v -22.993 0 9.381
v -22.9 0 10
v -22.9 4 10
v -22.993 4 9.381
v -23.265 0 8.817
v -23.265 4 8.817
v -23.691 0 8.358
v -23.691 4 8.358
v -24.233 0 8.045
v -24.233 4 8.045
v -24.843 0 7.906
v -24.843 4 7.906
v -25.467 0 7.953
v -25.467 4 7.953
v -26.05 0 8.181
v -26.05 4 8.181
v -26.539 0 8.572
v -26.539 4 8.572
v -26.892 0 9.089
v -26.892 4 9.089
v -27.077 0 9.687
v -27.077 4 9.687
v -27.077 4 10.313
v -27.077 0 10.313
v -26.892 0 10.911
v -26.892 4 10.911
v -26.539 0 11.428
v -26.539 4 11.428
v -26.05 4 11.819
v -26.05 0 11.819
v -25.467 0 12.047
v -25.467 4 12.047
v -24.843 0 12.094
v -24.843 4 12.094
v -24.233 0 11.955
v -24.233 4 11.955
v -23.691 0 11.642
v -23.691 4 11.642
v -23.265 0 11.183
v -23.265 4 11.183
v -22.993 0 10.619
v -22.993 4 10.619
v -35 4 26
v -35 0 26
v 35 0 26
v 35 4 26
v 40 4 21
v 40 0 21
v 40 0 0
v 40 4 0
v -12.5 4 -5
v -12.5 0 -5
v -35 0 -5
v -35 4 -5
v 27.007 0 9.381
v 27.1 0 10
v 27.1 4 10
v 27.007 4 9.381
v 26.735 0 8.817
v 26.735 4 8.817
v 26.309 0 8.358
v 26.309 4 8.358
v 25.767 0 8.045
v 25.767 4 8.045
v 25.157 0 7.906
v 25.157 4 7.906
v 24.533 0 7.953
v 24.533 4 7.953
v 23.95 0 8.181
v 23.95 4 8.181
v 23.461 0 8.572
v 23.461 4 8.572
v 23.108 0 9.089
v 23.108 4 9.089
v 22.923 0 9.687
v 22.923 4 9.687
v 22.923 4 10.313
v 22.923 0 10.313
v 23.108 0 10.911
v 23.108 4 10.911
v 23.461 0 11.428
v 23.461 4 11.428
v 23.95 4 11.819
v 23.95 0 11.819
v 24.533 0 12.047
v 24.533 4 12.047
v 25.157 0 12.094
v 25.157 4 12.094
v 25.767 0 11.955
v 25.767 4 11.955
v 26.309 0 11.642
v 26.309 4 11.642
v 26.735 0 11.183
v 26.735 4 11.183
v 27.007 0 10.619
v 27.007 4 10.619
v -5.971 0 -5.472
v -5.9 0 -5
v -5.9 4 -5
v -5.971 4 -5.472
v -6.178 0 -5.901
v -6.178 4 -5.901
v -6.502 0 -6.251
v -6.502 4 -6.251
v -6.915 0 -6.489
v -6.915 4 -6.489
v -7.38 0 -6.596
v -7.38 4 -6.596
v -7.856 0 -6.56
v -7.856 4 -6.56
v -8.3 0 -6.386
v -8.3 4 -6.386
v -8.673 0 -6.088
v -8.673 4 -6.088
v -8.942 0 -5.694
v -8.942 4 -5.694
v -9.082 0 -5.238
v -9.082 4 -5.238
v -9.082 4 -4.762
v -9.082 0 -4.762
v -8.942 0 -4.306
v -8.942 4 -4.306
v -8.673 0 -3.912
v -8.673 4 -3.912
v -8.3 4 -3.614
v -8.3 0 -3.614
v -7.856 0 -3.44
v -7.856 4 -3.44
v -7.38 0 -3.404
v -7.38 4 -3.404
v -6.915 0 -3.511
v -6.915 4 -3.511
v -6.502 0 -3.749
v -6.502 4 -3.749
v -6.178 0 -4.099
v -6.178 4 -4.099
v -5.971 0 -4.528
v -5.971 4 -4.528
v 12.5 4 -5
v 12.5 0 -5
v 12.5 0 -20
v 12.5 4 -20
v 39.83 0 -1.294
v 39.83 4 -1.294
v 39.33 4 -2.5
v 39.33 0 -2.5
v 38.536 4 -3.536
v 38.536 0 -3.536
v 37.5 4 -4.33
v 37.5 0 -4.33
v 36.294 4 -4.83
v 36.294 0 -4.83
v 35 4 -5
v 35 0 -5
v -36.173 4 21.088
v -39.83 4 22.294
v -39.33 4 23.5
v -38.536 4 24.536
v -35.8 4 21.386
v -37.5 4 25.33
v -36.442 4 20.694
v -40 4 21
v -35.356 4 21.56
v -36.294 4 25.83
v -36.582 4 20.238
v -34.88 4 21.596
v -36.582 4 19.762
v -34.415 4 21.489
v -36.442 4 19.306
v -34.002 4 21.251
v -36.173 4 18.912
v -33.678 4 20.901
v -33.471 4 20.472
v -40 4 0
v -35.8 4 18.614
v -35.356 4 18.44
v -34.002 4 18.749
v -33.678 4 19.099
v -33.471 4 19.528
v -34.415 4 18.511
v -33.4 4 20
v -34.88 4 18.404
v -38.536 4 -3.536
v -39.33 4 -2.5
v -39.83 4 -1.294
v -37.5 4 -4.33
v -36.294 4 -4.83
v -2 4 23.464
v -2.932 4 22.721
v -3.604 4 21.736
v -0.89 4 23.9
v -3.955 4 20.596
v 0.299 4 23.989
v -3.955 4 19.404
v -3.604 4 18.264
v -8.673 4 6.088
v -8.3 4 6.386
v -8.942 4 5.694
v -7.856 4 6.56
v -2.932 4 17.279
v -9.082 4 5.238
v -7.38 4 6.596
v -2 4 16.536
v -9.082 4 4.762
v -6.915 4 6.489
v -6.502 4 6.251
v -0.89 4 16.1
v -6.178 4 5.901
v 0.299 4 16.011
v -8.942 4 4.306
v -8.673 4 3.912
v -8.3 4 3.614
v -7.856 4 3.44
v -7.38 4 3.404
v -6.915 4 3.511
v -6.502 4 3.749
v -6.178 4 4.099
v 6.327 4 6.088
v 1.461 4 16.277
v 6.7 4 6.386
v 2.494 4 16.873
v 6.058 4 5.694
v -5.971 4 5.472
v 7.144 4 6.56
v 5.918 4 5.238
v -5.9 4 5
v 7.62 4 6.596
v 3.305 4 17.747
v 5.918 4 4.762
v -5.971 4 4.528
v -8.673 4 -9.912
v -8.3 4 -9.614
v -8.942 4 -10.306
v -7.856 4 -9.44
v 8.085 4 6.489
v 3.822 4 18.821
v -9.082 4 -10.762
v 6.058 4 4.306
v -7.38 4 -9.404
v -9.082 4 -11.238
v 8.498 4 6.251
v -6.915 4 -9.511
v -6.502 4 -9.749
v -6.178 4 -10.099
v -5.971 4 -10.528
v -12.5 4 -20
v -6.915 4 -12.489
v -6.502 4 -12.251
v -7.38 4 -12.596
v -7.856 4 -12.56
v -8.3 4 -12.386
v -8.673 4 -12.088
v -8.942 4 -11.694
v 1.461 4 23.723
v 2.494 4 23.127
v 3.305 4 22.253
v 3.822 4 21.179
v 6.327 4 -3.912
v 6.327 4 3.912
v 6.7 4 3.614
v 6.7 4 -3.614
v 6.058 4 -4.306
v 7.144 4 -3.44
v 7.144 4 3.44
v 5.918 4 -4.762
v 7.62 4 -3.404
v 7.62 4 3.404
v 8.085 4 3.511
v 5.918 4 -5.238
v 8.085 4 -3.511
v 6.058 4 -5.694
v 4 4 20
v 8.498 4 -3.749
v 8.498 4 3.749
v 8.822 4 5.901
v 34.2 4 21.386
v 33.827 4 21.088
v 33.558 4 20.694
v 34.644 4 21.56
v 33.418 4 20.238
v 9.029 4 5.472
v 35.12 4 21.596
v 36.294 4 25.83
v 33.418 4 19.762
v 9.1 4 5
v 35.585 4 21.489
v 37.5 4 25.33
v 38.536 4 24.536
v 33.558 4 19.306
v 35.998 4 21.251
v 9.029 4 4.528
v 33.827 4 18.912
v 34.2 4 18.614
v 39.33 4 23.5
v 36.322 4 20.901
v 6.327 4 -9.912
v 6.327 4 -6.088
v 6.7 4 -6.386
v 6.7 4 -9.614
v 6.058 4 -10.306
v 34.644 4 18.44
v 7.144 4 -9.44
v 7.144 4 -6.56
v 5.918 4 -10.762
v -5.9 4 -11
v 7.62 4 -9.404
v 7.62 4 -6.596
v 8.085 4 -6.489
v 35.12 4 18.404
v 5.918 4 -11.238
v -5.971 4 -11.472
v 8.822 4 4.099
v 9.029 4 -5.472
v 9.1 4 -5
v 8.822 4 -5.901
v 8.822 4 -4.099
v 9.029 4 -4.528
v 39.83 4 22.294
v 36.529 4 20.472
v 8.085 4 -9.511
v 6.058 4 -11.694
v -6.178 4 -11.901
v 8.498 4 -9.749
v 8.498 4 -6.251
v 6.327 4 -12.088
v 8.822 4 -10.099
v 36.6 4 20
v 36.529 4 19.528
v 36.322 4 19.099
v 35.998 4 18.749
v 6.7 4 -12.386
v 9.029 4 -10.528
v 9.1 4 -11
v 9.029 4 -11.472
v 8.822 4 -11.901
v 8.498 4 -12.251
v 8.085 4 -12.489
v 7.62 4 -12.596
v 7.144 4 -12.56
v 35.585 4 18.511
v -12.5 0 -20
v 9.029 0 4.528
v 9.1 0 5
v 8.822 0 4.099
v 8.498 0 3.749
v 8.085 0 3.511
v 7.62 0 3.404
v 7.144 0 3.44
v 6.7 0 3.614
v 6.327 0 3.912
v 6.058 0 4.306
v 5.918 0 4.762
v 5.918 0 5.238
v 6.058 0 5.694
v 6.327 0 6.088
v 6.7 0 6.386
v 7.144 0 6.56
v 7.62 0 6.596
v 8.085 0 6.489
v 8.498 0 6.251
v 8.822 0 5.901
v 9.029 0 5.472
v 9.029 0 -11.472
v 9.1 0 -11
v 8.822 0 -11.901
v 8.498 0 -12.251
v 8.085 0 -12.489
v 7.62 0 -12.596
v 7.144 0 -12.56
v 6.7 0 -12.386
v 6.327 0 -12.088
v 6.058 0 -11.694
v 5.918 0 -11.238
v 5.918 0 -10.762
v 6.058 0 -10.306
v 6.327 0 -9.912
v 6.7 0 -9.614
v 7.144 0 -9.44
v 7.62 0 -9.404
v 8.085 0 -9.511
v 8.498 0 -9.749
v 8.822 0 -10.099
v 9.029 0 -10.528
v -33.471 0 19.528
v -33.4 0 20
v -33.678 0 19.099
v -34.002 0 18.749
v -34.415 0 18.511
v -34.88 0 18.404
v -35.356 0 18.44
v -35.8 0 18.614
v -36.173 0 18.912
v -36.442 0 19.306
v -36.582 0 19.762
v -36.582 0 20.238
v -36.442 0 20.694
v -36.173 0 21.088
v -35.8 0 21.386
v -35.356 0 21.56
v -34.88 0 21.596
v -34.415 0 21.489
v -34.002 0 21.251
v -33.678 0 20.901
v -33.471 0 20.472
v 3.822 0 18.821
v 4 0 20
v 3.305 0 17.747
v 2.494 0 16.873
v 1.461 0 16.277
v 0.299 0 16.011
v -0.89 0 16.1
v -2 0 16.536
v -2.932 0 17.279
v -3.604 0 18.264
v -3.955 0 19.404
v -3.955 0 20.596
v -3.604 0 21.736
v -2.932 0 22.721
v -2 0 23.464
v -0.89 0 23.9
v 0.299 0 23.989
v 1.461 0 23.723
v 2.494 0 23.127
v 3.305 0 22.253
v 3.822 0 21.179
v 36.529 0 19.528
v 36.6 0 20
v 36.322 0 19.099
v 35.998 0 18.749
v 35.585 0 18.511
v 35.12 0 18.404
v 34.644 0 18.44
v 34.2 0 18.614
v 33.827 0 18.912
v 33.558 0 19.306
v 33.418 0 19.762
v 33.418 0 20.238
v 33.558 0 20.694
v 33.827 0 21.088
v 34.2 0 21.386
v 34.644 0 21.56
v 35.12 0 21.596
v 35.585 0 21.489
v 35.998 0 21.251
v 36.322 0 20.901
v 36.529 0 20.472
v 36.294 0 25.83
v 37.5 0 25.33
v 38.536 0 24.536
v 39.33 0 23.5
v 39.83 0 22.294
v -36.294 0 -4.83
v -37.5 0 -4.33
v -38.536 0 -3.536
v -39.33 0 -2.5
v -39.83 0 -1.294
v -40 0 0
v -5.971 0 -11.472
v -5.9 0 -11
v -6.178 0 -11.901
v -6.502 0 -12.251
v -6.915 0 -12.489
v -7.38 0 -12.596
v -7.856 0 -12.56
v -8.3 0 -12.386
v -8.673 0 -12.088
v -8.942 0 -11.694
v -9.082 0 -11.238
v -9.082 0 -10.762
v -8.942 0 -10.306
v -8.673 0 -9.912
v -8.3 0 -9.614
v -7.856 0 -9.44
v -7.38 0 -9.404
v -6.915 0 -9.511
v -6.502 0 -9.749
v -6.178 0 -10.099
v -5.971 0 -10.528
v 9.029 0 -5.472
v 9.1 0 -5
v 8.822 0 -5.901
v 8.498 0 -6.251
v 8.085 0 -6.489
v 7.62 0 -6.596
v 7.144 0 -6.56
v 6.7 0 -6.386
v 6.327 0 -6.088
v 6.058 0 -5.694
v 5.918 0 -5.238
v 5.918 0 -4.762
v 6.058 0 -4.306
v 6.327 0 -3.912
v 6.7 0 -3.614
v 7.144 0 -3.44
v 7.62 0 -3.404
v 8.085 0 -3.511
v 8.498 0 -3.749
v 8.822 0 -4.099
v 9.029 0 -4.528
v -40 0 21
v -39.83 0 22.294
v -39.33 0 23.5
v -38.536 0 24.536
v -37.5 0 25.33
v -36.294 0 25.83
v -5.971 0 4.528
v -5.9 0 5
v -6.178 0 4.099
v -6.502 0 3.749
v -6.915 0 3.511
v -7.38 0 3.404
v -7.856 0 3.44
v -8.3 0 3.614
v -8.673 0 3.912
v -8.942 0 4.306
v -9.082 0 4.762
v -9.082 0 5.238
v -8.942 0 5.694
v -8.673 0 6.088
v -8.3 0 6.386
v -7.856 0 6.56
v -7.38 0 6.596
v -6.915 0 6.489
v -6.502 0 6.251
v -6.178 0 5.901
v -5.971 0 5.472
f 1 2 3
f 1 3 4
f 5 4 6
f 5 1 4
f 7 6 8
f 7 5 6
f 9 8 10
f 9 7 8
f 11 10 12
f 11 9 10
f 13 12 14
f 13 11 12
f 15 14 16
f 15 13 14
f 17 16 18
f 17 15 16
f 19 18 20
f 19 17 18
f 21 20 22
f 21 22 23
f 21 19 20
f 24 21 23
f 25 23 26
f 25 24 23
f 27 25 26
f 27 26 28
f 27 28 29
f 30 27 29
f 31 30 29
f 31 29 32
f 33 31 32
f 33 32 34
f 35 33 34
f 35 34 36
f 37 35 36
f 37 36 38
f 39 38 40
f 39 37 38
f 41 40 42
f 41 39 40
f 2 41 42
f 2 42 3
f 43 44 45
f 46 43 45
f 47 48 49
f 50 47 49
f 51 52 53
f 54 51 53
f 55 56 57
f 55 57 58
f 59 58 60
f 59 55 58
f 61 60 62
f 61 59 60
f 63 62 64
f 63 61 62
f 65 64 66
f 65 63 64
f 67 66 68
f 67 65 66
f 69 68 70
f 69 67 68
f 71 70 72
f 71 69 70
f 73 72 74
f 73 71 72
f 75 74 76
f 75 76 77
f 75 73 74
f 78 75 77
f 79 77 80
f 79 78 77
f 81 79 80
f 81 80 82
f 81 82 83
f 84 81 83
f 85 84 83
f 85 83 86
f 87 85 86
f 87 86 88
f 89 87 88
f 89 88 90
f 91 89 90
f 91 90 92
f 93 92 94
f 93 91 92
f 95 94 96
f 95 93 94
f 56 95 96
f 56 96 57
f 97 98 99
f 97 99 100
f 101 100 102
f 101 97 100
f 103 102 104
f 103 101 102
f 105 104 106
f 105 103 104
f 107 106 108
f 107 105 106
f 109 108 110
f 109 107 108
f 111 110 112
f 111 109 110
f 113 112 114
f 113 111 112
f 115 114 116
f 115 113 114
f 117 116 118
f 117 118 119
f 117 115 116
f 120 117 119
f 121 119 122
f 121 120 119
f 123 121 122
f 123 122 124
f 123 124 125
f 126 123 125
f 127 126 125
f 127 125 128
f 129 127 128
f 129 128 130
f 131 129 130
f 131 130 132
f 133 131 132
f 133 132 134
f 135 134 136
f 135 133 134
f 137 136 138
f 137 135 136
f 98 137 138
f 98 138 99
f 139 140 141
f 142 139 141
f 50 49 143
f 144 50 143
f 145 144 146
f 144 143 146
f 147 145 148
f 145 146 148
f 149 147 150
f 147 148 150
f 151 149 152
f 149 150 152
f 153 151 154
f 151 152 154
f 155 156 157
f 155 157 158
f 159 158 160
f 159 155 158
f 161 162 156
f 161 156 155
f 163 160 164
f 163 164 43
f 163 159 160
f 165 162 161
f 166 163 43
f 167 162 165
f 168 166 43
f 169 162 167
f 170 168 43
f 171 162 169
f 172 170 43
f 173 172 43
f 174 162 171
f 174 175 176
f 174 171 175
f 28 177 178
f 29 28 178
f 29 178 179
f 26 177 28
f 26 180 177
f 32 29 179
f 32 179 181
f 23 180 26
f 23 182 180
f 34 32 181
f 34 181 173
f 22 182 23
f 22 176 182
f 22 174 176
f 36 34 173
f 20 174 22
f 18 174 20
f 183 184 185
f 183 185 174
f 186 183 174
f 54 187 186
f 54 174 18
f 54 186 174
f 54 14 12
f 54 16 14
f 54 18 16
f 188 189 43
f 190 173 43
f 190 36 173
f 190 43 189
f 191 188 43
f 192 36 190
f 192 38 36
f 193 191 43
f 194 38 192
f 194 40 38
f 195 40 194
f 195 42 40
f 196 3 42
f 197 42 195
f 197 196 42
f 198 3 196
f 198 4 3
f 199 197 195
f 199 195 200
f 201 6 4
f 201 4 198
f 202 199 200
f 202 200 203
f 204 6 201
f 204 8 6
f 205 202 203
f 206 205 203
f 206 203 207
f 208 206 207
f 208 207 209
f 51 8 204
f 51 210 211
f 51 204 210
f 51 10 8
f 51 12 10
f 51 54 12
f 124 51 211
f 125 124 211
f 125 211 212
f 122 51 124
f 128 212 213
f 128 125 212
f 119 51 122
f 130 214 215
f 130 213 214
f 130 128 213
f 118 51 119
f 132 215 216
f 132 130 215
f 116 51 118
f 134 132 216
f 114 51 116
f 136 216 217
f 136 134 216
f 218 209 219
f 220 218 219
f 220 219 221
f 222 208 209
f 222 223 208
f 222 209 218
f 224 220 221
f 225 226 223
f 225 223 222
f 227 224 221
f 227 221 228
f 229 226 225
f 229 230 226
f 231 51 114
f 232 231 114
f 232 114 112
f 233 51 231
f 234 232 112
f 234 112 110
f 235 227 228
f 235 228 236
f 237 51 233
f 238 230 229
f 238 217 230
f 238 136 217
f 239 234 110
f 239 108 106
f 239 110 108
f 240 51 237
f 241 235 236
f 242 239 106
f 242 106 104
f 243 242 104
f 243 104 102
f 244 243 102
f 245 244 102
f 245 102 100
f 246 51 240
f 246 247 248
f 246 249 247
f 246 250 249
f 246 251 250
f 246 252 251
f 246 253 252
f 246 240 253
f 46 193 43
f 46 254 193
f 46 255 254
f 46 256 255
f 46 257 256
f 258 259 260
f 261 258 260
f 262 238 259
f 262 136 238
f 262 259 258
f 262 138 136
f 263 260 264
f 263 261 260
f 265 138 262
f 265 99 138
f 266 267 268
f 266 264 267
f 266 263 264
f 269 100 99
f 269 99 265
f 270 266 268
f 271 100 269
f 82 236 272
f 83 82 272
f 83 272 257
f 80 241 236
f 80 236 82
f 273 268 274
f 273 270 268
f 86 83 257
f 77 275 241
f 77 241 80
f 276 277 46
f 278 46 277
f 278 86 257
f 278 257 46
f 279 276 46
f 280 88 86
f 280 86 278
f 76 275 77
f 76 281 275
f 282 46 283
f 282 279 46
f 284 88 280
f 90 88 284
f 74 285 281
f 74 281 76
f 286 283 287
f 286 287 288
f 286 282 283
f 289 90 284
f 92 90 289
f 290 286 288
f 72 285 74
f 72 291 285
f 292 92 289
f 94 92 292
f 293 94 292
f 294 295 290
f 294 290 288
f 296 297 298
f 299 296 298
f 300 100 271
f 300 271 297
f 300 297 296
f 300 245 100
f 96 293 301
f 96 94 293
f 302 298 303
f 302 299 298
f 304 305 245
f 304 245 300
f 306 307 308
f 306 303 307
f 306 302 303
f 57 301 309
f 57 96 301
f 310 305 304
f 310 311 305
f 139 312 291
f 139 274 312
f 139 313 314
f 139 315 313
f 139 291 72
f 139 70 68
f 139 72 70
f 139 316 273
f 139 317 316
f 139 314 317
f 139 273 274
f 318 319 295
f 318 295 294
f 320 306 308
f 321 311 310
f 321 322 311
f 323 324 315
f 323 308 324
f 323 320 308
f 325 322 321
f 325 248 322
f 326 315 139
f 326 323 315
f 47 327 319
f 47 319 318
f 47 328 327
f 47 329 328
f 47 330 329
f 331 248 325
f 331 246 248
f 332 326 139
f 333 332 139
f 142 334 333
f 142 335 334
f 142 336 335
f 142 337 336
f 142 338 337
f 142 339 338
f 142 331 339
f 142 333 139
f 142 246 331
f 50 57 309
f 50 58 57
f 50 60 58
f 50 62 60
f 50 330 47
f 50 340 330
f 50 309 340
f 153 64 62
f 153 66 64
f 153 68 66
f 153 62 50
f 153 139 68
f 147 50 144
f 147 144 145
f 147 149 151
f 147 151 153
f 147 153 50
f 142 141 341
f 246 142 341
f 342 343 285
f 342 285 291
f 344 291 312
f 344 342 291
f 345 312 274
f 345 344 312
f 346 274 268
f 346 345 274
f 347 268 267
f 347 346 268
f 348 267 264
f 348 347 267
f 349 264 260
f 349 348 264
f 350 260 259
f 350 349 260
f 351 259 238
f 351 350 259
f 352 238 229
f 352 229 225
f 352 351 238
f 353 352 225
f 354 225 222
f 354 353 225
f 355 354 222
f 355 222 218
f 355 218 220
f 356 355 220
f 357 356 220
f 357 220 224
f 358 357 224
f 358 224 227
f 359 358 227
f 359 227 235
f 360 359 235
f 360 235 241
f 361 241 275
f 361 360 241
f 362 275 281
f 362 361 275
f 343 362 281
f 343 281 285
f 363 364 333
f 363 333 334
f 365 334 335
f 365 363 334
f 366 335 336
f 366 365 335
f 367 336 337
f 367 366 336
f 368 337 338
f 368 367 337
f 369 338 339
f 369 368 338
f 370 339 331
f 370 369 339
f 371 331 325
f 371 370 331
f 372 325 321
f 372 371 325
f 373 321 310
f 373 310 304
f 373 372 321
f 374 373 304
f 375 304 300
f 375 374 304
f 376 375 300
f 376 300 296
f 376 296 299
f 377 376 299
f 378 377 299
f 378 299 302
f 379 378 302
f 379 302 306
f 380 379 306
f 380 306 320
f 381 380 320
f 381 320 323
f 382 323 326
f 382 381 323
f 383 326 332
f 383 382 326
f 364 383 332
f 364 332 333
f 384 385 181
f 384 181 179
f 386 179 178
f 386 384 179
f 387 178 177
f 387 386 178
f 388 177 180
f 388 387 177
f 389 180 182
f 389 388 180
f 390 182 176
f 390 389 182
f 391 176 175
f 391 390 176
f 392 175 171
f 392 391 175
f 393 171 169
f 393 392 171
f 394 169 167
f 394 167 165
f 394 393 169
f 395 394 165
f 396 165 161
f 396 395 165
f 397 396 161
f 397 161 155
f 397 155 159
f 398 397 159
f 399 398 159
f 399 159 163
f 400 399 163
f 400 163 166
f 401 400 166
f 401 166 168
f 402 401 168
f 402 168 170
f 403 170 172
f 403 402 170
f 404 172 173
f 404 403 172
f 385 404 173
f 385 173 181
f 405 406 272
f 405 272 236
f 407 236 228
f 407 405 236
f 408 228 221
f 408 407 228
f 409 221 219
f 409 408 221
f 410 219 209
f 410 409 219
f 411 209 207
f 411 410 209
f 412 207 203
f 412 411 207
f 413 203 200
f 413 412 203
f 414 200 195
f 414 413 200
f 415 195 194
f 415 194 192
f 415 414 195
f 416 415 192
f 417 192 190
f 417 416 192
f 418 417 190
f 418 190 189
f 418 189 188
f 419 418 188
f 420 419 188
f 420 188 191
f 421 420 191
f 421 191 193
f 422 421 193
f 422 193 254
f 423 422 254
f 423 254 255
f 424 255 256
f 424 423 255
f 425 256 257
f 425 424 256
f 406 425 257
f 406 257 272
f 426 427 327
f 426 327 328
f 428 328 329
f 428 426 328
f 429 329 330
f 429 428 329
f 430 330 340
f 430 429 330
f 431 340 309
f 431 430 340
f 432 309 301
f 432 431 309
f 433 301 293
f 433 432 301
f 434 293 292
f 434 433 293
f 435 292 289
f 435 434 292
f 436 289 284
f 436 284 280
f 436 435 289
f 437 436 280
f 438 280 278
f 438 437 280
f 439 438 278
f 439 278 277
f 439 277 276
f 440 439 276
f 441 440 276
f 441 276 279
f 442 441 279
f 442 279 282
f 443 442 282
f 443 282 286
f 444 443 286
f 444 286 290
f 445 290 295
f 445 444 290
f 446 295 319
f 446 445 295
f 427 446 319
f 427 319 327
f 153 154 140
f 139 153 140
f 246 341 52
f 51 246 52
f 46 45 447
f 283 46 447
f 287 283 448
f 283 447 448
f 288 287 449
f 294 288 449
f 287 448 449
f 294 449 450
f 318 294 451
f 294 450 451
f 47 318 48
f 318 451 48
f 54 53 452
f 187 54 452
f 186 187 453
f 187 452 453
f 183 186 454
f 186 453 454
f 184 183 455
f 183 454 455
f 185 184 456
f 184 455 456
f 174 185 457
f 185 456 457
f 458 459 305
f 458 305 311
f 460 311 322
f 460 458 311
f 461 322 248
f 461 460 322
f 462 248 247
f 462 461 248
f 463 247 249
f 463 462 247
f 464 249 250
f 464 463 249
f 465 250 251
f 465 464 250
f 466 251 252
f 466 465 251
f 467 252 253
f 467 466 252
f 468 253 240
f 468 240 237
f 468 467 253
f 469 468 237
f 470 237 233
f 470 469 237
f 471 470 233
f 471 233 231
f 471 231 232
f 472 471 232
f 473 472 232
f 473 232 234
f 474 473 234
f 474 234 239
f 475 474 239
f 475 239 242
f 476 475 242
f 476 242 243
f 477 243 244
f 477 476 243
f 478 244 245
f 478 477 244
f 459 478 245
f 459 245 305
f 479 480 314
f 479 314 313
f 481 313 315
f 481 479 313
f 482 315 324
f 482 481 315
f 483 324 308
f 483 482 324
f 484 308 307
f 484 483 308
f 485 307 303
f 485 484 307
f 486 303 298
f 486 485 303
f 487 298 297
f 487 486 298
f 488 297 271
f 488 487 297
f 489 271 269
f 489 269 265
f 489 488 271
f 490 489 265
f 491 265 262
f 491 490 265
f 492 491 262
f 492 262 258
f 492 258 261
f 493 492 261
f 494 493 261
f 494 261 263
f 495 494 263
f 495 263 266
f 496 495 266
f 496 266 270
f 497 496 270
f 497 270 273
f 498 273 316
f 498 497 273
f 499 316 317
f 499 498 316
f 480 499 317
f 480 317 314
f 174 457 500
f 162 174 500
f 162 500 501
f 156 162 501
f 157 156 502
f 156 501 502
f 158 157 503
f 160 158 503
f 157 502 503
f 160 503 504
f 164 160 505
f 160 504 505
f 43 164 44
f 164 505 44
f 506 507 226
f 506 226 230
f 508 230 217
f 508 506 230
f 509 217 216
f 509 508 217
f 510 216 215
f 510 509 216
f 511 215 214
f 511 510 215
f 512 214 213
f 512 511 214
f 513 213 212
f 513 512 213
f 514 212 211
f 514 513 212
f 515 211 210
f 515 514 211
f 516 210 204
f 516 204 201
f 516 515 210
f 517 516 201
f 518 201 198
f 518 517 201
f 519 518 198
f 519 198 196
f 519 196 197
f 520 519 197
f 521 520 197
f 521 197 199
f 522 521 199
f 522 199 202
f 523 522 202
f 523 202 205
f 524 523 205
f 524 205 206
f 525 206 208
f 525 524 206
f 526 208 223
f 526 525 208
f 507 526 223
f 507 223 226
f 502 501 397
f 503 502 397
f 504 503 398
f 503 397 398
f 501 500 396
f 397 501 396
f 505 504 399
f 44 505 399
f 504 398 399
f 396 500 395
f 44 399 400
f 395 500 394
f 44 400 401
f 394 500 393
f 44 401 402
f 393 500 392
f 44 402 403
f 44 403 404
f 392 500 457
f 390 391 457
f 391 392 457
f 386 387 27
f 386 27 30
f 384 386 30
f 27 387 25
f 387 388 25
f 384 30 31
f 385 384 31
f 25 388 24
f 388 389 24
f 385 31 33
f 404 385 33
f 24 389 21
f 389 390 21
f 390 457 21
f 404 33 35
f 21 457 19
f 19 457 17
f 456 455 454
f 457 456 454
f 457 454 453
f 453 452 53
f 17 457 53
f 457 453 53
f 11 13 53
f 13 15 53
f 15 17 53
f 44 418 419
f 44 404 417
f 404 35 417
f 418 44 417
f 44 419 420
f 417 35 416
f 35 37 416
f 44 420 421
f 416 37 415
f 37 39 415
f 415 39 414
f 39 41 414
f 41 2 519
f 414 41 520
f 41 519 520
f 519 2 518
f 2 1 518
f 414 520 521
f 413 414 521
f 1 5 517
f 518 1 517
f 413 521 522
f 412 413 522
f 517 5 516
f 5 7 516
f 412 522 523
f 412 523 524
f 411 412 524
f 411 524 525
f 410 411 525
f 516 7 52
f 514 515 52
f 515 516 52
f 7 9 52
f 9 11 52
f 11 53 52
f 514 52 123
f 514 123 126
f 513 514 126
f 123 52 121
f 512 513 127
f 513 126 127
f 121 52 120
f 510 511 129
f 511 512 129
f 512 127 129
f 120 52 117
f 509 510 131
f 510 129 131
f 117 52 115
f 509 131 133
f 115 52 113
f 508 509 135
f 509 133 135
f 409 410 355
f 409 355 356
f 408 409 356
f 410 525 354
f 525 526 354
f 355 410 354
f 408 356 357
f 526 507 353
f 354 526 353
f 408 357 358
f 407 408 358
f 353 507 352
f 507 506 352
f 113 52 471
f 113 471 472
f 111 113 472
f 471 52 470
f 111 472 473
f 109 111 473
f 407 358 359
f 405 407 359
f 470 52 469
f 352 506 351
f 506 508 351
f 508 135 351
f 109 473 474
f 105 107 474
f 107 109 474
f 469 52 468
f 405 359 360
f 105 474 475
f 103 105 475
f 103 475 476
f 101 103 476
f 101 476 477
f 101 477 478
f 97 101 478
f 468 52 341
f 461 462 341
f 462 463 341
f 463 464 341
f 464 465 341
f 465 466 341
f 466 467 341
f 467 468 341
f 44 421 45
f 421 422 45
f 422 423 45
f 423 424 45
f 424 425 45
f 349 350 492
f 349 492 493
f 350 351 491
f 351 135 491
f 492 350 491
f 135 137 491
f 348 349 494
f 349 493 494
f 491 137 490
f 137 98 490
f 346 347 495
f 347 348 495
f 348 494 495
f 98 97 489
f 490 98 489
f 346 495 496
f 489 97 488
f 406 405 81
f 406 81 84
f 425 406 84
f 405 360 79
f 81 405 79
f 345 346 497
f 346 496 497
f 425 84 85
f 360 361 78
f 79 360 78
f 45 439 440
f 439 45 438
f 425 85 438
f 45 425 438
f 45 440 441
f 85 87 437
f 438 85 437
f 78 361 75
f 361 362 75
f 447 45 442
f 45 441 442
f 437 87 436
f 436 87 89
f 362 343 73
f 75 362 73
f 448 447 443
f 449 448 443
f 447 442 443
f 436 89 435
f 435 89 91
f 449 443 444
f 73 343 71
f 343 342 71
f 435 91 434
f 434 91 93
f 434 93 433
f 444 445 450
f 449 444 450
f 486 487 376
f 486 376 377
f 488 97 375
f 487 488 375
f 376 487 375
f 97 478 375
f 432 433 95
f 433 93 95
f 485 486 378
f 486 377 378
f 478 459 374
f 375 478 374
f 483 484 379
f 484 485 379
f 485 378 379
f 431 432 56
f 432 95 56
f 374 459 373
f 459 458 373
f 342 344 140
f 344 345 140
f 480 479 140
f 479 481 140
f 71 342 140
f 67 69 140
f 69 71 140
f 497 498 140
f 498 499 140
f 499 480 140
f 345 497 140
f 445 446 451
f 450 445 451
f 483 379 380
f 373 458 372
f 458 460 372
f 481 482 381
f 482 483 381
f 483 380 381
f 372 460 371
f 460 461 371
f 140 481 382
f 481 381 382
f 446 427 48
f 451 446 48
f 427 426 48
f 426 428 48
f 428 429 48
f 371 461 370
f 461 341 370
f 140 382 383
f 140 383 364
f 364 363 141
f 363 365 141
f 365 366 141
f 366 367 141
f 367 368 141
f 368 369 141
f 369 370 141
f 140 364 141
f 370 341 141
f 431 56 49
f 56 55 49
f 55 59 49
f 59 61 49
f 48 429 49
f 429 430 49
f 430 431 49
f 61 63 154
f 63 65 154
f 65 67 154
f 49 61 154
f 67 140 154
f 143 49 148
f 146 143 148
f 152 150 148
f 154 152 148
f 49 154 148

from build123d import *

# Parameters (mm, degrees)
SKETCH1_R           = 1.6
SKETCH1_R_2         = 2.1
SKETCH1_R_3         = 4
BOSS_EXTRUDE1_DEPTH = 4


with BuildPart() as part:
    # Sketch1 → Boss-Extrude1 (new body)
    with BuildSketch(Plane(origin=(0, 0, 0), x_dir=(1, 0, 0), z_dir=(0, 1, 0))):
        with BuildLine():
            Line((-35, -26), (35, -26))
            ThreePointArc((35, -26), (38.535533906, -24.535533906), (40, -21))
            Line((40, -21), (40, 0))
            ThreePointArc((40, 0), (38.535533906, 3.535533906), (35, 5))
            Line((35, 5), (12.5, 5))
            Line((12.5, 5), (12.5, 20))
            Line((12.5, 20), (-12.5, 20))
            Line((-12.5, 20), (-12.5, 5))
            Line((-12.5, 5), (-35, 5))
            ThreePointArc((-35, 5), (-38.535533906, 3.535533906), (-40, 0))
            Line((-40, 0), (-40, -21))
            ThreePointArc((-40, -21), (-38.535533906, -24.535533906), (-35, -26))
        make_face()
        with Locations((-7.5, 11)):
            Circle(SKETCH1_R, mode=Mode.SUBTRACT)
        with Locations((7.5, 11)):
            Circle(SKETCH1_R, mode=Mode.SUBTRACT)
        with Locations((-7.5, -5)):
            Circle(SKETCH1_R, mode=Mode.SUBTRACT)
        with Locations((7.5, -5)):
            Circle(SKETCH1_R, mode=Mode.SUBTRACT)
        with Locations((-7.5, 5)):
            Circle(SKETCH1_R, mode=Mode.SUBTRACT)
        with Locations((7.5, 5)):
            Circle(SKETCH1_R, mode=Mode.SUBTRACT)
        with Locations((-35, -20)):
            Circle(SKETCH1_R, mode=Mode.SUBTRACT)
        with Locations((35, -20)):
            Circle(SKETCH1_R, mode=Mode.SUBTRACT)
        with Locations((-25, -10)):
            Circle(SKETCH1_R_2, mode=Mode.SUBTRACT)
        with Locations((25, -10)):
            Circle(SKETCH1_R_2, mode=Mode.SUBTRACT)
        with Locations((0, -20)):
            Circle(SKETCH1_R_3, mode=Mode.SUBTRACT)
    extrude(amount=BOSS_EXTRUDE1_DEPTH)


solid = part.part
